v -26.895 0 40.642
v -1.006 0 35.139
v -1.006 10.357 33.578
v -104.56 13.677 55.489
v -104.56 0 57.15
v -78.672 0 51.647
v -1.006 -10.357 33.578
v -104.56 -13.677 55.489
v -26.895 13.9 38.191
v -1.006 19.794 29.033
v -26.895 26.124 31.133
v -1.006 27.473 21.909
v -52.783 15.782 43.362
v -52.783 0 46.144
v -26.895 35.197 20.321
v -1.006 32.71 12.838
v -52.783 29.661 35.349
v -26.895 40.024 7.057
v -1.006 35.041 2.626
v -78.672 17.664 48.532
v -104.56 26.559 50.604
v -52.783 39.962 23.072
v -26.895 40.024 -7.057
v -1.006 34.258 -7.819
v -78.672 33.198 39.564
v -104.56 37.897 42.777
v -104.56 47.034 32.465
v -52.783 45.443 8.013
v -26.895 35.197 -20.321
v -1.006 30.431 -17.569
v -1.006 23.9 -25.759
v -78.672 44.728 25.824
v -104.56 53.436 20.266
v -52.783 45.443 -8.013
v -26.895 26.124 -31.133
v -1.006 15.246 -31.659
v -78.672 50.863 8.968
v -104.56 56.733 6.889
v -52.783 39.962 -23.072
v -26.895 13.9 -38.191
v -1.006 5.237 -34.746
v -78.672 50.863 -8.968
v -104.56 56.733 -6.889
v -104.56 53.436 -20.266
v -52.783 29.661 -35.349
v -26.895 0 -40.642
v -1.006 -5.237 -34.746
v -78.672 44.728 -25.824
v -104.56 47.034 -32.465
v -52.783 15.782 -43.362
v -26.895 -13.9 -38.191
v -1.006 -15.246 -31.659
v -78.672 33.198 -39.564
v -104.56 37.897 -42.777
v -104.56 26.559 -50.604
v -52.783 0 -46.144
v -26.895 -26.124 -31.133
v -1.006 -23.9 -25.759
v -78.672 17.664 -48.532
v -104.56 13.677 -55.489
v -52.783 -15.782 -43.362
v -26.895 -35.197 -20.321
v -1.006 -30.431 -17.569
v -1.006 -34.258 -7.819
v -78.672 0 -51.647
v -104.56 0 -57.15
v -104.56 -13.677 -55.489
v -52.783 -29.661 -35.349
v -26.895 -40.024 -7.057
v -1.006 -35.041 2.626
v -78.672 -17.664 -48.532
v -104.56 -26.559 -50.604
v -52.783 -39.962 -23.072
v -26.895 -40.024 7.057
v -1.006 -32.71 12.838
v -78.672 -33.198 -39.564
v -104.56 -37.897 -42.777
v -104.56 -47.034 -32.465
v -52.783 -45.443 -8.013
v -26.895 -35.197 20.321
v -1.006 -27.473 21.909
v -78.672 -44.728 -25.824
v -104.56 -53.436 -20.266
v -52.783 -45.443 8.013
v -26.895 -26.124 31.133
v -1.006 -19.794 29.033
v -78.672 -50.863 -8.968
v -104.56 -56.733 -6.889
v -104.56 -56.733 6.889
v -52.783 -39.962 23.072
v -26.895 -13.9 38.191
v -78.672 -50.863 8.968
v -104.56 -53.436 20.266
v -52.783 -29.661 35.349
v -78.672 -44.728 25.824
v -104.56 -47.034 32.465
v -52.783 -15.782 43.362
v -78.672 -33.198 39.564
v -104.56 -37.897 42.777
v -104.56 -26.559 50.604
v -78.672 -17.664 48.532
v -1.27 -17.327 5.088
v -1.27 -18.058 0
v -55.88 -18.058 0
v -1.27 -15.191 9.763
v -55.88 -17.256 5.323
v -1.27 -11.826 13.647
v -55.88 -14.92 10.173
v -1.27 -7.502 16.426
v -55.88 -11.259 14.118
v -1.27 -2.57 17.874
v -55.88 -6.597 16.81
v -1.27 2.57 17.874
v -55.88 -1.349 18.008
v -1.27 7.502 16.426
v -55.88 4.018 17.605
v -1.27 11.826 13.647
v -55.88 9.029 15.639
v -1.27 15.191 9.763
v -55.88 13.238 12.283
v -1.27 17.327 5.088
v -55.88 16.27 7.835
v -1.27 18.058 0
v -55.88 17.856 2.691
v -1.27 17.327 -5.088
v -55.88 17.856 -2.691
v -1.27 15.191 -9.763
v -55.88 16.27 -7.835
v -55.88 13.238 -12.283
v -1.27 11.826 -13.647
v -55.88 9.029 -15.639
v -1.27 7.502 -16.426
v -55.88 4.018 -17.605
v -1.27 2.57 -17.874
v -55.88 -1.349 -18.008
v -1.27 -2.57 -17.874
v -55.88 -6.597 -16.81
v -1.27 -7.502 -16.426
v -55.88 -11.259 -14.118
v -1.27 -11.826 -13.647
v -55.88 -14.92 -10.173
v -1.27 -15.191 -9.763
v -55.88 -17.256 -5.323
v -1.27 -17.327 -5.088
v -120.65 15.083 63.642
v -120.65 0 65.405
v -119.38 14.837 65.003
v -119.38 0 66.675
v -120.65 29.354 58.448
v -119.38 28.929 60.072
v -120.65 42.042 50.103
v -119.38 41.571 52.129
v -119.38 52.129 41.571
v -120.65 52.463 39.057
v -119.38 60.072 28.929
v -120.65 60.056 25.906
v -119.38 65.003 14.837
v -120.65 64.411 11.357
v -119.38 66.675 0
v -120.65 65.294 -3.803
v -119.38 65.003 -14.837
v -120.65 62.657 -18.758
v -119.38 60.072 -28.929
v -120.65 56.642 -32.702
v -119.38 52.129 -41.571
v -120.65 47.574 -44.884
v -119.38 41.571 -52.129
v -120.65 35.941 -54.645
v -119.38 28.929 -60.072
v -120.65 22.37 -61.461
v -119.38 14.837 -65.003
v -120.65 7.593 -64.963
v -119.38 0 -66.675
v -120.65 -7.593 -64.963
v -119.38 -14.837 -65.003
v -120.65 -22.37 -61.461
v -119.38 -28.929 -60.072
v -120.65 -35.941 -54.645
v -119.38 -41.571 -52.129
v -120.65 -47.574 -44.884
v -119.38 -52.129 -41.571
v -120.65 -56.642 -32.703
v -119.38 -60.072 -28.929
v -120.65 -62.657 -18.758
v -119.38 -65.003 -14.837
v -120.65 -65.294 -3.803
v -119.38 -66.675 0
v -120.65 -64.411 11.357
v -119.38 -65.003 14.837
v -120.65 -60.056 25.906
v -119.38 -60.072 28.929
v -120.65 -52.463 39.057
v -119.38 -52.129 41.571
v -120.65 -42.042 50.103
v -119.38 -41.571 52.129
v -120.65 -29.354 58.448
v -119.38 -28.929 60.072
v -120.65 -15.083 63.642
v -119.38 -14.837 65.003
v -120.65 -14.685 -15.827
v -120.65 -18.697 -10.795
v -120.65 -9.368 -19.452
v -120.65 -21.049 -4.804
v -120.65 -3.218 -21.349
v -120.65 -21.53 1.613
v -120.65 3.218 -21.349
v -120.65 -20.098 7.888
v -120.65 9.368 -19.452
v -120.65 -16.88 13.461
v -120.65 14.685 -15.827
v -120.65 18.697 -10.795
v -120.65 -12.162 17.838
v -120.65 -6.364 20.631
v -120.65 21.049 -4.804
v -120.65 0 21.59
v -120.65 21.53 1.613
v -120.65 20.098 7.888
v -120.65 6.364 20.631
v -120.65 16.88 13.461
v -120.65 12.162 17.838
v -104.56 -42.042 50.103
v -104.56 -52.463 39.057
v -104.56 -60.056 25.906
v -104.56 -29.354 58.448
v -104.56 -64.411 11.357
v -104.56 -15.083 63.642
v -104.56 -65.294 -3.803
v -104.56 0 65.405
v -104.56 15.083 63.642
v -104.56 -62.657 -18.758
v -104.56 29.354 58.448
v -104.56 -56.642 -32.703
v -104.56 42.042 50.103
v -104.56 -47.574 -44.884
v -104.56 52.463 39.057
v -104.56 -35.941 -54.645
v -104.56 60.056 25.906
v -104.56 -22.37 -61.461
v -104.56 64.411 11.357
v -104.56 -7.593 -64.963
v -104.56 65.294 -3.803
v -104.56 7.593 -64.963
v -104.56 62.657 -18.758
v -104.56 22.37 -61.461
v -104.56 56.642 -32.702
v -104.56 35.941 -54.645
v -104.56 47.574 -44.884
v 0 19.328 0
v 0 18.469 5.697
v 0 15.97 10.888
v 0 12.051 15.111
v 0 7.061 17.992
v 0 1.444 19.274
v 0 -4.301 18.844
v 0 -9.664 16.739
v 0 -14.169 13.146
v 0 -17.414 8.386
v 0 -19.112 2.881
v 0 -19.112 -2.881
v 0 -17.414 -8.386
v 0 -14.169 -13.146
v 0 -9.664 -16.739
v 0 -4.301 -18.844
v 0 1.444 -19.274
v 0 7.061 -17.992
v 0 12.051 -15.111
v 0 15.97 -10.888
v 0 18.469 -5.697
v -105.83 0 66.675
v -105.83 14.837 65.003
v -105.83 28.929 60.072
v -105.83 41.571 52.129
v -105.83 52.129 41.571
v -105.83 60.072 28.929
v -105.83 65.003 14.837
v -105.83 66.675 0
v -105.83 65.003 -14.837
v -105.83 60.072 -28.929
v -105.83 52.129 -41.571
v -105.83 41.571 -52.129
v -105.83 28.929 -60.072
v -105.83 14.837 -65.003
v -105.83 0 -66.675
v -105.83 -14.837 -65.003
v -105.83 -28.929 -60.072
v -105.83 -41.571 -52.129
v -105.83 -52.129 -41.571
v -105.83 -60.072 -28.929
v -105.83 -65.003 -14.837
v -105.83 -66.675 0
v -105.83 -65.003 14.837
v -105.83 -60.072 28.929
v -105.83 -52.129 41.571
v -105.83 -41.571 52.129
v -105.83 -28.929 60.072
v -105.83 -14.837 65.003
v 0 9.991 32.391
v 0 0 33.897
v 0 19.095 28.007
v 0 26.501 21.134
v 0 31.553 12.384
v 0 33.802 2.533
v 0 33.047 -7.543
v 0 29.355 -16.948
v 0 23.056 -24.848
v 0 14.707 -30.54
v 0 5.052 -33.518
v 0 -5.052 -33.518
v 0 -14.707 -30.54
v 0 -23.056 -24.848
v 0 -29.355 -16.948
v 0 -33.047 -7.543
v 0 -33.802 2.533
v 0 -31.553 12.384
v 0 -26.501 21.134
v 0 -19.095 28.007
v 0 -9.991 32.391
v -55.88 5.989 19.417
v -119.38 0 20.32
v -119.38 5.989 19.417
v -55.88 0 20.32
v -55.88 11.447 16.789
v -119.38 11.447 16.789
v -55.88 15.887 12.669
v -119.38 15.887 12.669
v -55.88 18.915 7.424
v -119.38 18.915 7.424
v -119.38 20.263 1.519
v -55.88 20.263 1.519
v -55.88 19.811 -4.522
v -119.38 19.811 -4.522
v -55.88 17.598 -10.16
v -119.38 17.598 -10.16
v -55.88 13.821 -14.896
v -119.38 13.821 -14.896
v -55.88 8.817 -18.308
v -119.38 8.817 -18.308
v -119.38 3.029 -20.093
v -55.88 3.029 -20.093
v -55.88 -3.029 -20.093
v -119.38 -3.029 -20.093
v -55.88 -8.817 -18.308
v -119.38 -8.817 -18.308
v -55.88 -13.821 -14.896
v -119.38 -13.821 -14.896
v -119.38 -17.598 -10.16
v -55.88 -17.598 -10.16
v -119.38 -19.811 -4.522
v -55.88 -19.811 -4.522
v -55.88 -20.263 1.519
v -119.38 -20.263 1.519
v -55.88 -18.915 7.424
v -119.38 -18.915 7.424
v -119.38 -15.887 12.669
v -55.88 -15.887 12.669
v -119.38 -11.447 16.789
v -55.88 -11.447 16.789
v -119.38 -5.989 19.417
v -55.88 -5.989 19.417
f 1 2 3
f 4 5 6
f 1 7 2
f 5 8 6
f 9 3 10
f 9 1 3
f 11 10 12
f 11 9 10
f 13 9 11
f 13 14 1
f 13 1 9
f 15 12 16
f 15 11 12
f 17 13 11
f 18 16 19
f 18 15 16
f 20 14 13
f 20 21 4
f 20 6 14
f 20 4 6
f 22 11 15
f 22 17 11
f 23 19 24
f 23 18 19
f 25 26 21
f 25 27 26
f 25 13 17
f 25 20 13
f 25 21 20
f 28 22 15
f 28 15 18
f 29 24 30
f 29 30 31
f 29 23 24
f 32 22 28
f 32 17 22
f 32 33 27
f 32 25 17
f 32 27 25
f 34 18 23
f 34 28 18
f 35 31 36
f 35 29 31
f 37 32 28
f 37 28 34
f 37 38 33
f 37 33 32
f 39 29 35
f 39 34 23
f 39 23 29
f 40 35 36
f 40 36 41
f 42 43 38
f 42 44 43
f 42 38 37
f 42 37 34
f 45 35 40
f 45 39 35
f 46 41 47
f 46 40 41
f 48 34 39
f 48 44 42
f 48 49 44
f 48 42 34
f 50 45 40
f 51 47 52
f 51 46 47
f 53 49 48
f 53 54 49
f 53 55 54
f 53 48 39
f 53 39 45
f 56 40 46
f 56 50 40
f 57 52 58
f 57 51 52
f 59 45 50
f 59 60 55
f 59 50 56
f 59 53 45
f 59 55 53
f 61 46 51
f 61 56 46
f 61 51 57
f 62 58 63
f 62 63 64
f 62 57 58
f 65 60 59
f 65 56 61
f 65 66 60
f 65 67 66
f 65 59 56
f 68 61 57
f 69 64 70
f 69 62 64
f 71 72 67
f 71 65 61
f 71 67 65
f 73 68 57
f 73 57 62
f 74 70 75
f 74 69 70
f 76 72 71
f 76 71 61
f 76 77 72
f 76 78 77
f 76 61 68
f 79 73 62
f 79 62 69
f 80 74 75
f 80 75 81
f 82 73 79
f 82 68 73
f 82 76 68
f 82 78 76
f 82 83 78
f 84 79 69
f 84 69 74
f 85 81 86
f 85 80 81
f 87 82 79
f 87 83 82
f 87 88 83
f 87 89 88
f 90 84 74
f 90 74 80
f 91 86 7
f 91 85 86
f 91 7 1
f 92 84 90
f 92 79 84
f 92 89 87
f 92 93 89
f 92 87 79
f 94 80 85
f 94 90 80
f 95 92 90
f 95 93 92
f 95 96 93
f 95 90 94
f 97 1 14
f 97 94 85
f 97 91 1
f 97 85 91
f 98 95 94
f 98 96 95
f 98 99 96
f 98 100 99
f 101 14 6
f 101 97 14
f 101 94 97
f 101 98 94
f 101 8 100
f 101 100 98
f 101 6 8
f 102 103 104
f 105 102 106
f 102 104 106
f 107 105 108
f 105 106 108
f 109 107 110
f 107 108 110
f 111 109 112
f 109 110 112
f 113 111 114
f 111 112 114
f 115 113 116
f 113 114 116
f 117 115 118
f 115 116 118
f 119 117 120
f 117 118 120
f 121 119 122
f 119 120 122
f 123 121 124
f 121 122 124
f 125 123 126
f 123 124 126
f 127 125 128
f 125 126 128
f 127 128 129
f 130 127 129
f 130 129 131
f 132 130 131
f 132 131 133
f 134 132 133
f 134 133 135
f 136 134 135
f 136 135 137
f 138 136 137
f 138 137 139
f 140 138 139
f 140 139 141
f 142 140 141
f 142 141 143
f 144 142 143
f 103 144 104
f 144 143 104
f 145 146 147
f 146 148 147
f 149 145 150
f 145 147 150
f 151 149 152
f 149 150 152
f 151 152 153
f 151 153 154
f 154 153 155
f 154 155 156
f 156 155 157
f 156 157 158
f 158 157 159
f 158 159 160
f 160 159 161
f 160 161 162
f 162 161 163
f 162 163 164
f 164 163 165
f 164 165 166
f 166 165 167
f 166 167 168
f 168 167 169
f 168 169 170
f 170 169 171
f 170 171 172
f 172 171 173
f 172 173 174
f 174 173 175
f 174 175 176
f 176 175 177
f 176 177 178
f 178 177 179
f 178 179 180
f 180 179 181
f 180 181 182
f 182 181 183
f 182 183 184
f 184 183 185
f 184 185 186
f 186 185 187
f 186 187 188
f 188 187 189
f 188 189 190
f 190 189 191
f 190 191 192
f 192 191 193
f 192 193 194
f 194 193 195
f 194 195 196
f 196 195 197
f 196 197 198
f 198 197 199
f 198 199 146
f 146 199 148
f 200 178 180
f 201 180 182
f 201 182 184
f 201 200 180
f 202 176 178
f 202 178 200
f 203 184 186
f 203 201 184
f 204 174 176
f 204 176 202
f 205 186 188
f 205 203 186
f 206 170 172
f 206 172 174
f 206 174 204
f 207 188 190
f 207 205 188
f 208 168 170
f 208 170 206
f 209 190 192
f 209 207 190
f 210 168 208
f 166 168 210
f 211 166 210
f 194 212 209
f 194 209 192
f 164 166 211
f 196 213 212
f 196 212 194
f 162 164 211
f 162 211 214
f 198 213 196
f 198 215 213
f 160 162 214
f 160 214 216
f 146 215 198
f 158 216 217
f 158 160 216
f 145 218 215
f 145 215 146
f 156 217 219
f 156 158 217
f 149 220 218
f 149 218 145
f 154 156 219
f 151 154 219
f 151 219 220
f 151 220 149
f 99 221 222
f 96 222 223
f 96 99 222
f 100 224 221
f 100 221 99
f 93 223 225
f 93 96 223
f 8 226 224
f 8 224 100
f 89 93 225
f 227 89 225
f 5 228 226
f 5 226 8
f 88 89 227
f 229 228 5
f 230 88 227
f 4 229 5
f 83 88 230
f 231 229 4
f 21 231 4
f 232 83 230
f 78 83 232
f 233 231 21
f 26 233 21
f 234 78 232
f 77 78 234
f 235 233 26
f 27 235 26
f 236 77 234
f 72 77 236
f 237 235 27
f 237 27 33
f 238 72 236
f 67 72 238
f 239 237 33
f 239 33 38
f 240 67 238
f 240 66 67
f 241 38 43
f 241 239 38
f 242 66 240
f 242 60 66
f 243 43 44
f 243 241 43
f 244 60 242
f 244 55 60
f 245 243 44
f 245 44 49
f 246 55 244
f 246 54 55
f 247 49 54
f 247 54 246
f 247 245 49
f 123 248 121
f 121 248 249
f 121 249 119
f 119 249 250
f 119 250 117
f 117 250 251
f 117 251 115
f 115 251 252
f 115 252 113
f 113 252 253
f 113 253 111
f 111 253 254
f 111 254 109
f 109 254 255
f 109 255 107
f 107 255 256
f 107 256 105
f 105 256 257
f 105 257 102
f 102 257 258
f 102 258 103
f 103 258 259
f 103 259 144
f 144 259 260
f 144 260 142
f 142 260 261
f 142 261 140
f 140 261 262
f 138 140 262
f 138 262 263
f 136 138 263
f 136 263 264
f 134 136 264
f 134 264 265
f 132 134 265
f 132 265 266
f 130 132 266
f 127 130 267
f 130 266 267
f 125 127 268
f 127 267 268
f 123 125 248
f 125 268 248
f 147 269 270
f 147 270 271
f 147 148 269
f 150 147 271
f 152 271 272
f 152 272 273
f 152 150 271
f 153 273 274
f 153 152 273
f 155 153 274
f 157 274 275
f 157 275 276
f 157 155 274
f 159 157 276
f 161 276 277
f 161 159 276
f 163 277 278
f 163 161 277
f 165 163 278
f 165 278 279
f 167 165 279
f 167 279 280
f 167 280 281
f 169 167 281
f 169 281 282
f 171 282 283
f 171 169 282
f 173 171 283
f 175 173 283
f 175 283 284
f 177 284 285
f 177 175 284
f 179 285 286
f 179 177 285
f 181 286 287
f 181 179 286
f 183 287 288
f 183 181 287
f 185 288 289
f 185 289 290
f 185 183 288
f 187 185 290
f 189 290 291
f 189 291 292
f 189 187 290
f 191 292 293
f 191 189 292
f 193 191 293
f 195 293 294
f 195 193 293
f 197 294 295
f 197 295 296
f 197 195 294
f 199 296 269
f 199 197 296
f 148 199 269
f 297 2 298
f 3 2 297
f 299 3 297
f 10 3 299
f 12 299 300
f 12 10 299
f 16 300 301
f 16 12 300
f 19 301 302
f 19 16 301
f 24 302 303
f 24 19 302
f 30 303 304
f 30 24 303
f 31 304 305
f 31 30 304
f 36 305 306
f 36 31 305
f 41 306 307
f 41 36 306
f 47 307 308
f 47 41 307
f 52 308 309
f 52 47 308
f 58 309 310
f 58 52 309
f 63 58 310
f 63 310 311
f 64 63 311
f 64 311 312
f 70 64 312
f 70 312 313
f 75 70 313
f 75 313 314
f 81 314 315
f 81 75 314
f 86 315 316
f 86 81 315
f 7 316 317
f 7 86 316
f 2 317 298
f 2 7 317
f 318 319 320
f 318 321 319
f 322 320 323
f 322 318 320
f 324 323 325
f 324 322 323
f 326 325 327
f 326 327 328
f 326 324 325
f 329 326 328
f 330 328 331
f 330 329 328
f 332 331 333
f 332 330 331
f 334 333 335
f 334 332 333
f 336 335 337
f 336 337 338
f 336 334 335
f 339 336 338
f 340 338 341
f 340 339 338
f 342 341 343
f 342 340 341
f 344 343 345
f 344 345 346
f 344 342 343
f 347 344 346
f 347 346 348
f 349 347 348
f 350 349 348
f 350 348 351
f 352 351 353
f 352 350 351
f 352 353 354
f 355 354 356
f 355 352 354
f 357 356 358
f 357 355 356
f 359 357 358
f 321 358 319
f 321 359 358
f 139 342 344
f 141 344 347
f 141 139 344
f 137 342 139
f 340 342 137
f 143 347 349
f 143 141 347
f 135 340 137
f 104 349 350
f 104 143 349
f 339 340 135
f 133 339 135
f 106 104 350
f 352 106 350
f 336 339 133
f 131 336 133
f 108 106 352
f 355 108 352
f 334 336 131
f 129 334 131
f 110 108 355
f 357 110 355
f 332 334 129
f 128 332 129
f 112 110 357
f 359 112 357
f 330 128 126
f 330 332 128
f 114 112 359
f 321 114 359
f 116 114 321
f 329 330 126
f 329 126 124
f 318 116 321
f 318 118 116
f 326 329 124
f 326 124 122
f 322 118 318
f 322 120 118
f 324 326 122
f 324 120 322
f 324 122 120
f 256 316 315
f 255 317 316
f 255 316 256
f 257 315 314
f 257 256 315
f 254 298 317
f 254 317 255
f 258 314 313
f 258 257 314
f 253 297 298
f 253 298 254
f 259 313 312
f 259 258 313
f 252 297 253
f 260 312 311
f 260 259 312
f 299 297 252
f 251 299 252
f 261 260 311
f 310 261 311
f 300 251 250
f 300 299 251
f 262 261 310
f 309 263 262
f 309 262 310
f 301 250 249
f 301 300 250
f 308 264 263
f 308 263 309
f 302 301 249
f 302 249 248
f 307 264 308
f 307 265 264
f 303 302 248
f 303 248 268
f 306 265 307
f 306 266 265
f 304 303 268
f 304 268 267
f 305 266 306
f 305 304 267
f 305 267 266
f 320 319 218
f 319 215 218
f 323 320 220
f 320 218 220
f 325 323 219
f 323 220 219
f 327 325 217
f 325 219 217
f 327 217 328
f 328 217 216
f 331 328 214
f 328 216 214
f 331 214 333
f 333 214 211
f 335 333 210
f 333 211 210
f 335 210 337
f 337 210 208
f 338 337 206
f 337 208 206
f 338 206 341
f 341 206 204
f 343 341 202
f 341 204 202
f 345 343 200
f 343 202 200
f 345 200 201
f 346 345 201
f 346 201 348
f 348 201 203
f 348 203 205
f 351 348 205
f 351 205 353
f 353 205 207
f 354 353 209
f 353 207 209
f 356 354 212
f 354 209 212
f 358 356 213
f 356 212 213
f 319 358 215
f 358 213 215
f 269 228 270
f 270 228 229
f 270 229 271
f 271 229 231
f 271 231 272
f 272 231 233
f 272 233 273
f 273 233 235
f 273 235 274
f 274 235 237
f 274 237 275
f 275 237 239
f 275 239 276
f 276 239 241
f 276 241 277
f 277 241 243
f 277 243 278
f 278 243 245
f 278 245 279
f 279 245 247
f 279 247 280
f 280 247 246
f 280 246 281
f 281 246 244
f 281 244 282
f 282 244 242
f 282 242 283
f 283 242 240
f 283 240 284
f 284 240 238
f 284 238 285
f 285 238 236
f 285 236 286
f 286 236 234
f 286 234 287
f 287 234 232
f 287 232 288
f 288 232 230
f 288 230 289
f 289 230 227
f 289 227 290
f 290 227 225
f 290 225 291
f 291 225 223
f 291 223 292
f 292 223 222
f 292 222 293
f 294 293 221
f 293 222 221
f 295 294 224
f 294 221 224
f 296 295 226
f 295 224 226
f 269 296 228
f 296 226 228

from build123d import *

# Parameters (mm, degrees)
F3_D = 36.11626


# Not quite as in the source:
# - a fillet or chamfer that OpenCascade refuses, or shapes differently, is made with other operations: its cross-section is extruded or revolved along the edge and cut away or added


with BuildPart() as f1:
    # F0 (on Front) → F1 (revolve)
    with BuildSketch(Plane.XZ):
        Polygon((0, 0), (0, 34.925), (-104.5604041832, 57.15), (-104.5604041832, 66.675), (-120.65, 66.675), (-120.65, 20.32), (-55.88, 20.32), (-55.88, 0), align=None)
    revolve(axis=Axis((-55.6578852736, 0, 0), (-1, 0, 0)))

    # F3 (through all)
    with Locations(Plane.YZ):
        with Locations((0, 0)):
            Hole(F3_D / 2)

    # F4: chamfer of 1.27 on 5 edges, made by hand

    # F4_s1 → F4_t2 (revolve, cut)
    with BuildSketch(Plane.XZ):
        Polygon((-120.65, 65.405), (-119.38, 66.675), (-120.65, 66.675), align=None)
    revolve(axis=Axis((-120.65, 0, 0), (-1, 0, 0)), mode=Mode.SUBTRACT)

    # F4_s3 → F4_t4 (revolve, cut)
    with BuildSketch(Plane.XZ):
        Polygon((-119.38, 20.32), (-120.65, 21.59), (-120.65, 20.32), align=None)
    revolve(axis=Axis((-120.65, 0, 0), (-1, 0, 0)), mode=Mode.SUBTRACT)

    # F4_s5 → F4_t6 (revolve, cut)
    with BuildSketch(Plane.XZ):
        Polygon((-105.8304041832, 66.675), (-104.5604041832, 65.405), (-104.5604041832, 66.675), align=None)
    revolve(axis=Axis((-104.5604041832, 0, 0), (-1, 0, 0)), mode=Mode.SUBTRACT)

    # F4_s7 → F4_t8 (revolve, cut)
    with BuildSketch(Plane.XZ):
        Polygon((0, 33.8965742778), (-1.0059521527, 35.1388217308), (0, 34.925), align=None)
    revolve(axis=Axis((0, 0, 0), (-1, 0, 0)), mode=Mode.SUBTRACT)

    # F4_s9 → F4_t10 (revolve, cut)
    with BuildSketch(Plane.XY):
        Polygon((-1.27, 18.05813), (0, 19.32813), (0, 18.05813), align=None)
    revolve(axis=Axis((0, 0, 0), (1, 0, 0)), mode=Mode.SUBTRACT)


solid = f1.part
